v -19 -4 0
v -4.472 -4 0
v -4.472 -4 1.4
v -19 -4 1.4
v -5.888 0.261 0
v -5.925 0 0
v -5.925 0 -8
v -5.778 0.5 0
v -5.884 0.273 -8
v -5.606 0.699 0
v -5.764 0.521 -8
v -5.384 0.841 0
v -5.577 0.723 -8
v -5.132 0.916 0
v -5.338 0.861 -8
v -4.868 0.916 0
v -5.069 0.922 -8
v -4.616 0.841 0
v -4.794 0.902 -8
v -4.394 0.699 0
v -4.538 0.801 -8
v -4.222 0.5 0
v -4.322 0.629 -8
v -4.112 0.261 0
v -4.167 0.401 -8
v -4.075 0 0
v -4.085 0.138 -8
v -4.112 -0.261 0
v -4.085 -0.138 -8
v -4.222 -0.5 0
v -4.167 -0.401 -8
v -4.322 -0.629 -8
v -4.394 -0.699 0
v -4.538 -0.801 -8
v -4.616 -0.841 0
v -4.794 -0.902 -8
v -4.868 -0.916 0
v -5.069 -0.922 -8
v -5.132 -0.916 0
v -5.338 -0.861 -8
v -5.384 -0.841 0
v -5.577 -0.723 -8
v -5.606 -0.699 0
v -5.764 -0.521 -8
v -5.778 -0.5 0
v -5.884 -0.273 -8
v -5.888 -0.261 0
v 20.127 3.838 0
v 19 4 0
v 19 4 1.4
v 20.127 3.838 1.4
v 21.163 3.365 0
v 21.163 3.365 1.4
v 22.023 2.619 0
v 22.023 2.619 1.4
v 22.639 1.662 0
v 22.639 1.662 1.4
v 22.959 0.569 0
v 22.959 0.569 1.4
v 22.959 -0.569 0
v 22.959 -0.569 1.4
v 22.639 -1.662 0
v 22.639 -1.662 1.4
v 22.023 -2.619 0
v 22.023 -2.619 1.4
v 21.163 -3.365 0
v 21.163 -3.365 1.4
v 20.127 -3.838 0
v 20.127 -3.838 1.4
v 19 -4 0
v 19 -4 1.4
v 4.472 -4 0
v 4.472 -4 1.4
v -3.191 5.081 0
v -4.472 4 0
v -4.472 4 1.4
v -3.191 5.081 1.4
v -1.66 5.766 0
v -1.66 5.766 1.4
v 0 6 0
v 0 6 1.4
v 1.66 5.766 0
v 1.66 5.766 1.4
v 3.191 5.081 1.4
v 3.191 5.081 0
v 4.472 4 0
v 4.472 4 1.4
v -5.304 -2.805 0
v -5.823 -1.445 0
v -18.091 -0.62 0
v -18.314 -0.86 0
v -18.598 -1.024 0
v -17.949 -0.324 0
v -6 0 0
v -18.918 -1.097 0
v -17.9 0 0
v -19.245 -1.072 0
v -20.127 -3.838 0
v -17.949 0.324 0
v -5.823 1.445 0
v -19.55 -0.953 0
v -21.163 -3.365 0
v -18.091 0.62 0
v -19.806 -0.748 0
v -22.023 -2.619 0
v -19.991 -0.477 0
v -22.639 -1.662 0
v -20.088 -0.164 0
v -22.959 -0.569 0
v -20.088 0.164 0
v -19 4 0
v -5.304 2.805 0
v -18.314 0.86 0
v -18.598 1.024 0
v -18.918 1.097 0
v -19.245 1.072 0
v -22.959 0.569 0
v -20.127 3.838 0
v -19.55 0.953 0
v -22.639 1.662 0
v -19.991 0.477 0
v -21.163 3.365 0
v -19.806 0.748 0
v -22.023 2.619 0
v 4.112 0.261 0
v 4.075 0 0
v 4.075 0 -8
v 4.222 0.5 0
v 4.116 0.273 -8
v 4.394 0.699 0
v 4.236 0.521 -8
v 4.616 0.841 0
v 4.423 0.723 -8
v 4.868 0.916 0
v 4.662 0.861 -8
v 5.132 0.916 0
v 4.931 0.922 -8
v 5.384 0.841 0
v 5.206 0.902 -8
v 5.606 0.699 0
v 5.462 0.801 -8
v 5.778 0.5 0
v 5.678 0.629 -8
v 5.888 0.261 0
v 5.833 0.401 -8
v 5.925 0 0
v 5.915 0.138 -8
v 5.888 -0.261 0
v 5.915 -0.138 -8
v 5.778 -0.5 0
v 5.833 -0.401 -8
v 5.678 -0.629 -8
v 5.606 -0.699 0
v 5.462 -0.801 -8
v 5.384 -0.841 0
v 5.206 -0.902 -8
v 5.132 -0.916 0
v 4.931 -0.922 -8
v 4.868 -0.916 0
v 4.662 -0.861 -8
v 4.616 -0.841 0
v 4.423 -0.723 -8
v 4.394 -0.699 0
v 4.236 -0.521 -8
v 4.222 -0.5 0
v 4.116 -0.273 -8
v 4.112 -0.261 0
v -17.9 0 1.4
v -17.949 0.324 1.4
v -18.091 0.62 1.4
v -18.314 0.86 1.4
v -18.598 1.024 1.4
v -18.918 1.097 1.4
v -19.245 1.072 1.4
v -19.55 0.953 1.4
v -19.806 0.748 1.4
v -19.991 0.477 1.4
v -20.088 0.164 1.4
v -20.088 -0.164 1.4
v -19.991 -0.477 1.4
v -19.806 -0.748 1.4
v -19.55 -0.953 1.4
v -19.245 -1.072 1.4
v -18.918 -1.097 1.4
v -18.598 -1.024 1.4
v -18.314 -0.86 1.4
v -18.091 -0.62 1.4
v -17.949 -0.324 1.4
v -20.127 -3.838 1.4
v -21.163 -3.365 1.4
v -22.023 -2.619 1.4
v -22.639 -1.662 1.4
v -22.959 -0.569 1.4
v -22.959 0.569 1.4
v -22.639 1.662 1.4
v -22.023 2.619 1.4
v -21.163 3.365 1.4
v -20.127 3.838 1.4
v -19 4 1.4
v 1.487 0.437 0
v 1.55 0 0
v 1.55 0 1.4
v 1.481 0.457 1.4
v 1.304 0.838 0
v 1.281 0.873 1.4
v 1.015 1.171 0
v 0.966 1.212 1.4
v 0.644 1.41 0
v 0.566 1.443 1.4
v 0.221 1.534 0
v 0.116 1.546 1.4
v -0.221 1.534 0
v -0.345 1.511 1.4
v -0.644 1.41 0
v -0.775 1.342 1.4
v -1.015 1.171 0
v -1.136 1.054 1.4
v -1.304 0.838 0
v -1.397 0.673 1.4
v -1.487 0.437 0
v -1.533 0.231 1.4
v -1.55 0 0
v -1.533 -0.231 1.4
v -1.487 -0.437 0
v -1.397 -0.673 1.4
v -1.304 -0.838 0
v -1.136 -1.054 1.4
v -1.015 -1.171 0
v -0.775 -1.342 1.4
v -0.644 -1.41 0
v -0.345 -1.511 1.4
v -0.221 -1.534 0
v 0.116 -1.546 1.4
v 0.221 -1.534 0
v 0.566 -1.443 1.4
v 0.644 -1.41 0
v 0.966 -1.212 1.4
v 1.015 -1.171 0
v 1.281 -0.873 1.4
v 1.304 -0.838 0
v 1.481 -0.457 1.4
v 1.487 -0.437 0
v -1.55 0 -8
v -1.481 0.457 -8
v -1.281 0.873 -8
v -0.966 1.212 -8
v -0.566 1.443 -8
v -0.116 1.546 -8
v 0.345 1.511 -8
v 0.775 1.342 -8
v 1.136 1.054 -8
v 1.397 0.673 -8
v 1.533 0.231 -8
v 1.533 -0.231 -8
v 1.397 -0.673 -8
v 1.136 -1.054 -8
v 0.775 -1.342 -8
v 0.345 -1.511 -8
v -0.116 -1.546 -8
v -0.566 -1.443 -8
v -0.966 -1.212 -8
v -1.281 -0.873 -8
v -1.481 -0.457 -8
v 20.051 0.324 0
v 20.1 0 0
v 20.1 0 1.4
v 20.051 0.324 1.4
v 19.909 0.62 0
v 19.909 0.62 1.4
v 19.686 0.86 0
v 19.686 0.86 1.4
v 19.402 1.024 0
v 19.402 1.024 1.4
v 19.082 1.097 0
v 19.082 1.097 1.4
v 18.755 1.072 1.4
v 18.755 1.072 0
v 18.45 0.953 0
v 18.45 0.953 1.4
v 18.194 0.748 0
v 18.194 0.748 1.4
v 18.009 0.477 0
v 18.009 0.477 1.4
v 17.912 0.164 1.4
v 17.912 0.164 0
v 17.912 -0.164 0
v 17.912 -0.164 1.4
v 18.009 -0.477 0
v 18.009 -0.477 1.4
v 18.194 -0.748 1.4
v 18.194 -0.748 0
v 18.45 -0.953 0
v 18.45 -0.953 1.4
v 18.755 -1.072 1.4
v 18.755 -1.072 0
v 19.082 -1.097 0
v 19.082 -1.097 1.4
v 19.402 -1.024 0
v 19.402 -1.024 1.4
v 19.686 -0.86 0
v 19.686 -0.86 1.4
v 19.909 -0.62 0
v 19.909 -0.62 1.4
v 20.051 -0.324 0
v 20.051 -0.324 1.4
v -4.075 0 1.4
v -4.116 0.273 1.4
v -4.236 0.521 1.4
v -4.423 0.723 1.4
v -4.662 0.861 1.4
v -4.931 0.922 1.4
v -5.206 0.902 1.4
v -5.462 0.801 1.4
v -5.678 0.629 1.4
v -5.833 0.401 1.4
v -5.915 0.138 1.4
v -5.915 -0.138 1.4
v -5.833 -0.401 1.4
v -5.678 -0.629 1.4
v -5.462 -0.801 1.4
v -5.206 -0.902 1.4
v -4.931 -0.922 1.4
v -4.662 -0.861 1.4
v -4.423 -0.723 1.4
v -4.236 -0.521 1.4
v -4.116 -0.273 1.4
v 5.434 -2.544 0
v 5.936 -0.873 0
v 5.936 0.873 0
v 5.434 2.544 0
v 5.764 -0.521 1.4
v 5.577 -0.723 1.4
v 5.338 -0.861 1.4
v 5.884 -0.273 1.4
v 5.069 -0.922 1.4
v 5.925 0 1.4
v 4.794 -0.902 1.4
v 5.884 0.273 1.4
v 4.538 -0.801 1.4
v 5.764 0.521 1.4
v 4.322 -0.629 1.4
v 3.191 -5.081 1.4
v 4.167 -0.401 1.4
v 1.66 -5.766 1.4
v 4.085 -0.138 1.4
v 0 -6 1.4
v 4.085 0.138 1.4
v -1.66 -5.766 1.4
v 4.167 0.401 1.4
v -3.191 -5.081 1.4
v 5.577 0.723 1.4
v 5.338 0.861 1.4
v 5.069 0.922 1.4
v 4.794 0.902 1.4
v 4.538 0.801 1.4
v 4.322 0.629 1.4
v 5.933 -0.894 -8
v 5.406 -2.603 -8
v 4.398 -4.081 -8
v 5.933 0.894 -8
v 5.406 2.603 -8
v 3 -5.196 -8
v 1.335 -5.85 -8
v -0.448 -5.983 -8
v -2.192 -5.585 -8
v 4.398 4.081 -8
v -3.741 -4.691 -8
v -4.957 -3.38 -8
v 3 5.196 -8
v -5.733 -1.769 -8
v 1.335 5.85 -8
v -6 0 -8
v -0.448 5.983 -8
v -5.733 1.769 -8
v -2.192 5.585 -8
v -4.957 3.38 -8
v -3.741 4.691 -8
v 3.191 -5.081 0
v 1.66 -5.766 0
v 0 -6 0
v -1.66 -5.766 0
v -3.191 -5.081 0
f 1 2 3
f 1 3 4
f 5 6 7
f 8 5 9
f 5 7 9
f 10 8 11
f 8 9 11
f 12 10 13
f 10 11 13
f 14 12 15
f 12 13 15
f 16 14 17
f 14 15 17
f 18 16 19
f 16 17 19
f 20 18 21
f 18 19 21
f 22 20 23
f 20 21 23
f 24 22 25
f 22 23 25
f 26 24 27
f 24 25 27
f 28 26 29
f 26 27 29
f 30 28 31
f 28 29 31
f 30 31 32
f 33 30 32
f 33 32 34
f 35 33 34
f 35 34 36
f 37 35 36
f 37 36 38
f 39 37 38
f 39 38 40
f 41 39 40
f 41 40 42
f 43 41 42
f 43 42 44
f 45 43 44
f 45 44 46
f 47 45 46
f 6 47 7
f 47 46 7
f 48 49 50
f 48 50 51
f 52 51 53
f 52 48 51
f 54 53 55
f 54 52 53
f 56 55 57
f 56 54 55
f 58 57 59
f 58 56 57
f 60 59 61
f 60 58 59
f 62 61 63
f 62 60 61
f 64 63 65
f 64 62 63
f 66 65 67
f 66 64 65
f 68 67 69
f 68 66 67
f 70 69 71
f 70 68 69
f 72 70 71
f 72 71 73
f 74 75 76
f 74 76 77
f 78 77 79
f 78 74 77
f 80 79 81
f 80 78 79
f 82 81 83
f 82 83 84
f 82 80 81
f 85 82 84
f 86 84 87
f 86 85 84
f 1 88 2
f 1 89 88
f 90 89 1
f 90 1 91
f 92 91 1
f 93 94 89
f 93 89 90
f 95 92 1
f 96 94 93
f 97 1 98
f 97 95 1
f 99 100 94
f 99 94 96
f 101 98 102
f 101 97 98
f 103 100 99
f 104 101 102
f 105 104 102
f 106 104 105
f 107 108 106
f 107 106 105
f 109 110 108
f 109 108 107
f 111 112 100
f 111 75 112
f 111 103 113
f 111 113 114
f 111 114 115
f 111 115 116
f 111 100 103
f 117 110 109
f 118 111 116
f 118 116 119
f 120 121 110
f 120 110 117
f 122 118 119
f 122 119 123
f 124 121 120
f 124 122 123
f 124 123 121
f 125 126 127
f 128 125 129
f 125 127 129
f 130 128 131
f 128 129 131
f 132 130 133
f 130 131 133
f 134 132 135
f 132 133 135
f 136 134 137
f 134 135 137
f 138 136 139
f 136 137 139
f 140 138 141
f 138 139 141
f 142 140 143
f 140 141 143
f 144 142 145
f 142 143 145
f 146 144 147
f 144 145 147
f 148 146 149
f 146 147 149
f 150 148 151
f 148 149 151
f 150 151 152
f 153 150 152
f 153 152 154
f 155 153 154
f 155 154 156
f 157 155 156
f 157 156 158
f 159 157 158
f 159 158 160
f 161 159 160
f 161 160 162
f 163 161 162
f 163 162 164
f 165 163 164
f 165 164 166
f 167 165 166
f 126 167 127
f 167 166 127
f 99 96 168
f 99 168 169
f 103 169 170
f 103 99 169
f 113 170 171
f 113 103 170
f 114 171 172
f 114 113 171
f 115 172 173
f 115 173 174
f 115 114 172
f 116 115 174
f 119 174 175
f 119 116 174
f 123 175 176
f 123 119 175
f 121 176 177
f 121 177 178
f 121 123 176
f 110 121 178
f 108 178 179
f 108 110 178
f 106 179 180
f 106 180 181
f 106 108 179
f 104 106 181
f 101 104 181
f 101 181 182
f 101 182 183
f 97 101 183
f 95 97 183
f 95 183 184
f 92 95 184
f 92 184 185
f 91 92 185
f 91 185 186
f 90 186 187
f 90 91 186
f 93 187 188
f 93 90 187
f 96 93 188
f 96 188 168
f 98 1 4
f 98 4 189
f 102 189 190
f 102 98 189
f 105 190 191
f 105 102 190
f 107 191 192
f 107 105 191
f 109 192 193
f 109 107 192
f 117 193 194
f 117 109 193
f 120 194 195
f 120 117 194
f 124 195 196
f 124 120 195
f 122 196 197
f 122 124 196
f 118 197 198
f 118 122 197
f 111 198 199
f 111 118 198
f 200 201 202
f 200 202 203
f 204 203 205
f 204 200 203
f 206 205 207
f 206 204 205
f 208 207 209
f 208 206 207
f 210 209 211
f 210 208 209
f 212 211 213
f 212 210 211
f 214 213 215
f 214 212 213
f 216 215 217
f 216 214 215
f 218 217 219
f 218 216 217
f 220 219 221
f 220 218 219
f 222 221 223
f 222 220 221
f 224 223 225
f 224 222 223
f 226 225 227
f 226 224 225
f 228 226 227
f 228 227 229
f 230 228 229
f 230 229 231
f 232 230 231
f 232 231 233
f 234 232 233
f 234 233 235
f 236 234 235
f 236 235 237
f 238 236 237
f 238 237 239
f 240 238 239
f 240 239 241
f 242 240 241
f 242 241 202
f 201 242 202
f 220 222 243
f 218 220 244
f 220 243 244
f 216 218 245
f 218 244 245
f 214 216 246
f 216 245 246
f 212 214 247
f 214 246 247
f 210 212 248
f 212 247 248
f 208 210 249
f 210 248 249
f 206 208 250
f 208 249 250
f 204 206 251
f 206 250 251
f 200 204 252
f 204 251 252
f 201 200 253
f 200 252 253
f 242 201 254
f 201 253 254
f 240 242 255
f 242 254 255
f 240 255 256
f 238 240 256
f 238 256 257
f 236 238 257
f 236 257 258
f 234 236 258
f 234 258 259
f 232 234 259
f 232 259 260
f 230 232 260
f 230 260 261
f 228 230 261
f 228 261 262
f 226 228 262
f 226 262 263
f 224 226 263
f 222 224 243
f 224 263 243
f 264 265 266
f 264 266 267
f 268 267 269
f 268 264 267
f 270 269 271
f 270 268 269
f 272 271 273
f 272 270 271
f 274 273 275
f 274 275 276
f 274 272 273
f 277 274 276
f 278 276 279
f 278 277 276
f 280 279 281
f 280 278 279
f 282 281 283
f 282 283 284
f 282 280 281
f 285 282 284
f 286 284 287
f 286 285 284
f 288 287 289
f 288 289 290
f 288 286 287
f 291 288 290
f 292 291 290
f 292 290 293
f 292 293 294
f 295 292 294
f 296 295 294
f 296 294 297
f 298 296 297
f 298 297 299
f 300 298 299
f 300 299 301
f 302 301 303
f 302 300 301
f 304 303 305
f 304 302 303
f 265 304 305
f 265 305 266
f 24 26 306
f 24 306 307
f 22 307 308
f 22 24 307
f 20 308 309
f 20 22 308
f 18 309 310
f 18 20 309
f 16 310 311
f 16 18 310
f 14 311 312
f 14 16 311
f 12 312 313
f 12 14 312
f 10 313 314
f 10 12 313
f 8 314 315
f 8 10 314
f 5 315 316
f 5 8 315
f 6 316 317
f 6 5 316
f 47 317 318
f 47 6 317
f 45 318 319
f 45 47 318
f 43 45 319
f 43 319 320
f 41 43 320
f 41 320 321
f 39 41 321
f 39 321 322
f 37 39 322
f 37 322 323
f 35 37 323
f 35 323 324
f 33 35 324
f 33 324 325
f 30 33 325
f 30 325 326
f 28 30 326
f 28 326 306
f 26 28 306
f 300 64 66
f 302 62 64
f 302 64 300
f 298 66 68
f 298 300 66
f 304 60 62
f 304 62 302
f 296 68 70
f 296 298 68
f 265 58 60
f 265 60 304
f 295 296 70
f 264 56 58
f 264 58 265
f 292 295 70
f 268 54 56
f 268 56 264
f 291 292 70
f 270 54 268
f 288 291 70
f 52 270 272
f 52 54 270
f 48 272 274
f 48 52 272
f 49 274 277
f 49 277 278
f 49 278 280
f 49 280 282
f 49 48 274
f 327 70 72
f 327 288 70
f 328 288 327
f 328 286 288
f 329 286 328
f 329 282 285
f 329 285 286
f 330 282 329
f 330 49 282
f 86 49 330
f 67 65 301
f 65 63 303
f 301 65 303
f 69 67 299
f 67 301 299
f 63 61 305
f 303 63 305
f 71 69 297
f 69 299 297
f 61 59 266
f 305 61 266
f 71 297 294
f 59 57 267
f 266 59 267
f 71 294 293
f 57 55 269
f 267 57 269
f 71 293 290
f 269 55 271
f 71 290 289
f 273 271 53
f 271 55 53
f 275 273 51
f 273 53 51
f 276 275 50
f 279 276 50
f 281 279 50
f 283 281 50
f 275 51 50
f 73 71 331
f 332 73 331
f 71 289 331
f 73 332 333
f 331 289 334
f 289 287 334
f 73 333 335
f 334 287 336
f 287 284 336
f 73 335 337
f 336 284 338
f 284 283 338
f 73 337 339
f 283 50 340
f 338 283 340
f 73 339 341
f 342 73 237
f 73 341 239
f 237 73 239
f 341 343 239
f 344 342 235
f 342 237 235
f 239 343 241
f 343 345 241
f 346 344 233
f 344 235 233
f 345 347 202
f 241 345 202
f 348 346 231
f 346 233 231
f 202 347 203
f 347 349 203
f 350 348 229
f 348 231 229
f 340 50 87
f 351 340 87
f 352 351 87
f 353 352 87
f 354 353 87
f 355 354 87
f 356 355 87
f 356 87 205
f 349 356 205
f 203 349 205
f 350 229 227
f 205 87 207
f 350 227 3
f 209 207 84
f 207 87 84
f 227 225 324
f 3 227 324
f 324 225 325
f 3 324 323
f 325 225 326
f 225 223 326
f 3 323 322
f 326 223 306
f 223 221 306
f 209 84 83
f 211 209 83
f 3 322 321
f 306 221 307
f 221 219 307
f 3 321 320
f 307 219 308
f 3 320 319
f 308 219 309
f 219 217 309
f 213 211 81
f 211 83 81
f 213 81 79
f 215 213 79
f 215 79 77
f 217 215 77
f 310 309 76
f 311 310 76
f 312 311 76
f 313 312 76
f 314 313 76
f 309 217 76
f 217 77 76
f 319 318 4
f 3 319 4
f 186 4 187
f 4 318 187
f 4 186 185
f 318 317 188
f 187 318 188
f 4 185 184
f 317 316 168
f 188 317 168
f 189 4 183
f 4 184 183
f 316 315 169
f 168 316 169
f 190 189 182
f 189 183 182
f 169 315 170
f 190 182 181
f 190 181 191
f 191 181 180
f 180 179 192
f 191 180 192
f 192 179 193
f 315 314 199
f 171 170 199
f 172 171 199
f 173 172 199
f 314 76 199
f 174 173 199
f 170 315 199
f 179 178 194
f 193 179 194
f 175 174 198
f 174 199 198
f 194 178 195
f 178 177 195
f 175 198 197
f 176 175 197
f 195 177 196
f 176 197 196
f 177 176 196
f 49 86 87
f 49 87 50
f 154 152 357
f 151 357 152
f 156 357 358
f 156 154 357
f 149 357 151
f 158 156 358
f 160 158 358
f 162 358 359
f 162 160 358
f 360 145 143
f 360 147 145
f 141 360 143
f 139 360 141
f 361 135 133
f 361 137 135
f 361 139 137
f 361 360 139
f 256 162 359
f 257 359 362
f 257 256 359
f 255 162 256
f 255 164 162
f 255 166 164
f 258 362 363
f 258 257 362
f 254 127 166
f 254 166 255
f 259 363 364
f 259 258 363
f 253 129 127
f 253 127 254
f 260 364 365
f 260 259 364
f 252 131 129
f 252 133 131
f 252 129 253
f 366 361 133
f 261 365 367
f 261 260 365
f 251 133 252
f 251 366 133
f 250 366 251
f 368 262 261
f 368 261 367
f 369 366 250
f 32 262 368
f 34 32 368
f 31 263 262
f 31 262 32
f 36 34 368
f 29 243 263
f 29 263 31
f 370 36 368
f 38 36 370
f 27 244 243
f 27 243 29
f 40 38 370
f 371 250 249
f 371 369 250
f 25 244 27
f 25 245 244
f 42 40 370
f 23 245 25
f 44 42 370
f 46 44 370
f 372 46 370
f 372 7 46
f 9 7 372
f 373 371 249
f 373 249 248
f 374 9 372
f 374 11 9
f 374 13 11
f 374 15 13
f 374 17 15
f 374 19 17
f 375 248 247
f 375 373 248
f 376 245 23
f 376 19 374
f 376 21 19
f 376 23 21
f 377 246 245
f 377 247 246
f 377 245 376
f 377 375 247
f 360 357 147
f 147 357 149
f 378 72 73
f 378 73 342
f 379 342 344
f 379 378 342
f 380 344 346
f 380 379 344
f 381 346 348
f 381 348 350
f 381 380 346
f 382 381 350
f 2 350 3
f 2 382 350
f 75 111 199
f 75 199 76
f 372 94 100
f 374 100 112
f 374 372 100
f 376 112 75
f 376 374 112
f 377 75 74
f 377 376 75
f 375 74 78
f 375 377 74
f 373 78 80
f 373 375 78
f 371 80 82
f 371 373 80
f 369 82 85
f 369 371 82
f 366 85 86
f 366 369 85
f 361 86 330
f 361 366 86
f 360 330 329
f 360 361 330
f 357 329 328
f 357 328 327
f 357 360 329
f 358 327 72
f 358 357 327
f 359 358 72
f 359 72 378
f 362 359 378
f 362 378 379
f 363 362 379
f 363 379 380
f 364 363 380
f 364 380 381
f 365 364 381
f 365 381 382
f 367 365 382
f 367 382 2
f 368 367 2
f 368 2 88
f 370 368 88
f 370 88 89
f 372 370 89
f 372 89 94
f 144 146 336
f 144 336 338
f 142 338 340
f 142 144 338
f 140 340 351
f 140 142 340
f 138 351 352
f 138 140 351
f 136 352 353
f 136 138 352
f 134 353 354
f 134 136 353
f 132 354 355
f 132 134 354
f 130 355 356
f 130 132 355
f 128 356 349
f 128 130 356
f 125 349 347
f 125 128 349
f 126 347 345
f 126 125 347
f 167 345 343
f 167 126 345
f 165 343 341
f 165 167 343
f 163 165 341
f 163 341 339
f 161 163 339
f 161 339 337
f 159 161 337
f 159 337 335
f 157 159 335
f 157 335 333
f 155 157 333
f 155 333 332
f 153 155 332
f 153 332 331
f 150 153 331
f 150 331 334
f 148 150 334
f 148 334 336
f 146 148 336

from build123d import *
from build123d.topology import SkipClean

# Parameters (mm, degrees)
SKETCH_1_R      = 1.55
SKETCH_1_R_2    = 1.1
SKETCH_1_R_3    = 0.925
EXTRUDE_1_DEPTH = 1.4
EXTRUDE_START   = 8
SKETCH_2_R      = 6
SKETCH_2_R_2    = 1.55
SKETCH_2_R_3    = 0.925
EXTRUDE_2_DEPTH = 8


with BuildPart() as part:
    # 草图1 → 凸台-拉伸1 (new body)
    with BuildSketch(Plane.XY):
        with BuildLine():
            Line((4.472135955, 4), (19, 4))
            ThreePointArc((19, 4), (23, 0), (19, -4))
            Line((19, -4), (4.472135955, -4))
            ThreePointArc((4.472135955, -4), (0, -6), (-4.472135955, -4))
            Line((-4.472135955, -4), (-19, -4))
            ThreePointArc((-19, -4), (-23, 0), (-19, 4))
            Line((-19, 4), (-4.472135955, 4))
            ThreePointArc((-4.472135955, 4), (0, 6), (4.472135955, 4))
        make_face()
        Circle(SKETCH_1_R, mode=Mode.SUBTRACT)
        with Locations((19, 0)):
            Circle(SKETCH_1_R_2, mode=Mode.SUBTRACT)
        with Locations((-19, 0)):
            Circle(SKETCH_1_R_2, mode=Mode.SUBTRACT)
        with Locations((-5, 0)):
            Circle(SKETCH_1_R_3, mode=Mode.SUBTRACT)
        with Locations((5, 0)):
            Circle(SKETCH_1_R_3, mode=Mode.SUBTRACT)
    extrude(amount=EXTRUDE_1_DEPTH)

    # 草图2 → 凸台-拉伸2 (add)
    with SkipClean():  # the faces are left unmerged after this step: merging them gives an invalid solid
        with BuildSketch(Plane(origin=(0, 0, 0), x_dir=(-1, 0, 0), z_dir=(0, 0, -1)).offset(EXTRUDE_START)):
            Circle(SKETCH_2_R)
            Circle(SKETCH_2_R_2, mode=Mode.SUBTRACT)
            with Locations((-5, 0)):
                Circle(SKETCH_2_R_3, mode=Mode.SUBTRACT)
            with Locations((5, 0)):
                Circle(SKETCH_2_R_3, mode=Mode.SUBTRACT)
        extrude(amount=-EXTRUDE_2_DEPTH)


solid = part.part
